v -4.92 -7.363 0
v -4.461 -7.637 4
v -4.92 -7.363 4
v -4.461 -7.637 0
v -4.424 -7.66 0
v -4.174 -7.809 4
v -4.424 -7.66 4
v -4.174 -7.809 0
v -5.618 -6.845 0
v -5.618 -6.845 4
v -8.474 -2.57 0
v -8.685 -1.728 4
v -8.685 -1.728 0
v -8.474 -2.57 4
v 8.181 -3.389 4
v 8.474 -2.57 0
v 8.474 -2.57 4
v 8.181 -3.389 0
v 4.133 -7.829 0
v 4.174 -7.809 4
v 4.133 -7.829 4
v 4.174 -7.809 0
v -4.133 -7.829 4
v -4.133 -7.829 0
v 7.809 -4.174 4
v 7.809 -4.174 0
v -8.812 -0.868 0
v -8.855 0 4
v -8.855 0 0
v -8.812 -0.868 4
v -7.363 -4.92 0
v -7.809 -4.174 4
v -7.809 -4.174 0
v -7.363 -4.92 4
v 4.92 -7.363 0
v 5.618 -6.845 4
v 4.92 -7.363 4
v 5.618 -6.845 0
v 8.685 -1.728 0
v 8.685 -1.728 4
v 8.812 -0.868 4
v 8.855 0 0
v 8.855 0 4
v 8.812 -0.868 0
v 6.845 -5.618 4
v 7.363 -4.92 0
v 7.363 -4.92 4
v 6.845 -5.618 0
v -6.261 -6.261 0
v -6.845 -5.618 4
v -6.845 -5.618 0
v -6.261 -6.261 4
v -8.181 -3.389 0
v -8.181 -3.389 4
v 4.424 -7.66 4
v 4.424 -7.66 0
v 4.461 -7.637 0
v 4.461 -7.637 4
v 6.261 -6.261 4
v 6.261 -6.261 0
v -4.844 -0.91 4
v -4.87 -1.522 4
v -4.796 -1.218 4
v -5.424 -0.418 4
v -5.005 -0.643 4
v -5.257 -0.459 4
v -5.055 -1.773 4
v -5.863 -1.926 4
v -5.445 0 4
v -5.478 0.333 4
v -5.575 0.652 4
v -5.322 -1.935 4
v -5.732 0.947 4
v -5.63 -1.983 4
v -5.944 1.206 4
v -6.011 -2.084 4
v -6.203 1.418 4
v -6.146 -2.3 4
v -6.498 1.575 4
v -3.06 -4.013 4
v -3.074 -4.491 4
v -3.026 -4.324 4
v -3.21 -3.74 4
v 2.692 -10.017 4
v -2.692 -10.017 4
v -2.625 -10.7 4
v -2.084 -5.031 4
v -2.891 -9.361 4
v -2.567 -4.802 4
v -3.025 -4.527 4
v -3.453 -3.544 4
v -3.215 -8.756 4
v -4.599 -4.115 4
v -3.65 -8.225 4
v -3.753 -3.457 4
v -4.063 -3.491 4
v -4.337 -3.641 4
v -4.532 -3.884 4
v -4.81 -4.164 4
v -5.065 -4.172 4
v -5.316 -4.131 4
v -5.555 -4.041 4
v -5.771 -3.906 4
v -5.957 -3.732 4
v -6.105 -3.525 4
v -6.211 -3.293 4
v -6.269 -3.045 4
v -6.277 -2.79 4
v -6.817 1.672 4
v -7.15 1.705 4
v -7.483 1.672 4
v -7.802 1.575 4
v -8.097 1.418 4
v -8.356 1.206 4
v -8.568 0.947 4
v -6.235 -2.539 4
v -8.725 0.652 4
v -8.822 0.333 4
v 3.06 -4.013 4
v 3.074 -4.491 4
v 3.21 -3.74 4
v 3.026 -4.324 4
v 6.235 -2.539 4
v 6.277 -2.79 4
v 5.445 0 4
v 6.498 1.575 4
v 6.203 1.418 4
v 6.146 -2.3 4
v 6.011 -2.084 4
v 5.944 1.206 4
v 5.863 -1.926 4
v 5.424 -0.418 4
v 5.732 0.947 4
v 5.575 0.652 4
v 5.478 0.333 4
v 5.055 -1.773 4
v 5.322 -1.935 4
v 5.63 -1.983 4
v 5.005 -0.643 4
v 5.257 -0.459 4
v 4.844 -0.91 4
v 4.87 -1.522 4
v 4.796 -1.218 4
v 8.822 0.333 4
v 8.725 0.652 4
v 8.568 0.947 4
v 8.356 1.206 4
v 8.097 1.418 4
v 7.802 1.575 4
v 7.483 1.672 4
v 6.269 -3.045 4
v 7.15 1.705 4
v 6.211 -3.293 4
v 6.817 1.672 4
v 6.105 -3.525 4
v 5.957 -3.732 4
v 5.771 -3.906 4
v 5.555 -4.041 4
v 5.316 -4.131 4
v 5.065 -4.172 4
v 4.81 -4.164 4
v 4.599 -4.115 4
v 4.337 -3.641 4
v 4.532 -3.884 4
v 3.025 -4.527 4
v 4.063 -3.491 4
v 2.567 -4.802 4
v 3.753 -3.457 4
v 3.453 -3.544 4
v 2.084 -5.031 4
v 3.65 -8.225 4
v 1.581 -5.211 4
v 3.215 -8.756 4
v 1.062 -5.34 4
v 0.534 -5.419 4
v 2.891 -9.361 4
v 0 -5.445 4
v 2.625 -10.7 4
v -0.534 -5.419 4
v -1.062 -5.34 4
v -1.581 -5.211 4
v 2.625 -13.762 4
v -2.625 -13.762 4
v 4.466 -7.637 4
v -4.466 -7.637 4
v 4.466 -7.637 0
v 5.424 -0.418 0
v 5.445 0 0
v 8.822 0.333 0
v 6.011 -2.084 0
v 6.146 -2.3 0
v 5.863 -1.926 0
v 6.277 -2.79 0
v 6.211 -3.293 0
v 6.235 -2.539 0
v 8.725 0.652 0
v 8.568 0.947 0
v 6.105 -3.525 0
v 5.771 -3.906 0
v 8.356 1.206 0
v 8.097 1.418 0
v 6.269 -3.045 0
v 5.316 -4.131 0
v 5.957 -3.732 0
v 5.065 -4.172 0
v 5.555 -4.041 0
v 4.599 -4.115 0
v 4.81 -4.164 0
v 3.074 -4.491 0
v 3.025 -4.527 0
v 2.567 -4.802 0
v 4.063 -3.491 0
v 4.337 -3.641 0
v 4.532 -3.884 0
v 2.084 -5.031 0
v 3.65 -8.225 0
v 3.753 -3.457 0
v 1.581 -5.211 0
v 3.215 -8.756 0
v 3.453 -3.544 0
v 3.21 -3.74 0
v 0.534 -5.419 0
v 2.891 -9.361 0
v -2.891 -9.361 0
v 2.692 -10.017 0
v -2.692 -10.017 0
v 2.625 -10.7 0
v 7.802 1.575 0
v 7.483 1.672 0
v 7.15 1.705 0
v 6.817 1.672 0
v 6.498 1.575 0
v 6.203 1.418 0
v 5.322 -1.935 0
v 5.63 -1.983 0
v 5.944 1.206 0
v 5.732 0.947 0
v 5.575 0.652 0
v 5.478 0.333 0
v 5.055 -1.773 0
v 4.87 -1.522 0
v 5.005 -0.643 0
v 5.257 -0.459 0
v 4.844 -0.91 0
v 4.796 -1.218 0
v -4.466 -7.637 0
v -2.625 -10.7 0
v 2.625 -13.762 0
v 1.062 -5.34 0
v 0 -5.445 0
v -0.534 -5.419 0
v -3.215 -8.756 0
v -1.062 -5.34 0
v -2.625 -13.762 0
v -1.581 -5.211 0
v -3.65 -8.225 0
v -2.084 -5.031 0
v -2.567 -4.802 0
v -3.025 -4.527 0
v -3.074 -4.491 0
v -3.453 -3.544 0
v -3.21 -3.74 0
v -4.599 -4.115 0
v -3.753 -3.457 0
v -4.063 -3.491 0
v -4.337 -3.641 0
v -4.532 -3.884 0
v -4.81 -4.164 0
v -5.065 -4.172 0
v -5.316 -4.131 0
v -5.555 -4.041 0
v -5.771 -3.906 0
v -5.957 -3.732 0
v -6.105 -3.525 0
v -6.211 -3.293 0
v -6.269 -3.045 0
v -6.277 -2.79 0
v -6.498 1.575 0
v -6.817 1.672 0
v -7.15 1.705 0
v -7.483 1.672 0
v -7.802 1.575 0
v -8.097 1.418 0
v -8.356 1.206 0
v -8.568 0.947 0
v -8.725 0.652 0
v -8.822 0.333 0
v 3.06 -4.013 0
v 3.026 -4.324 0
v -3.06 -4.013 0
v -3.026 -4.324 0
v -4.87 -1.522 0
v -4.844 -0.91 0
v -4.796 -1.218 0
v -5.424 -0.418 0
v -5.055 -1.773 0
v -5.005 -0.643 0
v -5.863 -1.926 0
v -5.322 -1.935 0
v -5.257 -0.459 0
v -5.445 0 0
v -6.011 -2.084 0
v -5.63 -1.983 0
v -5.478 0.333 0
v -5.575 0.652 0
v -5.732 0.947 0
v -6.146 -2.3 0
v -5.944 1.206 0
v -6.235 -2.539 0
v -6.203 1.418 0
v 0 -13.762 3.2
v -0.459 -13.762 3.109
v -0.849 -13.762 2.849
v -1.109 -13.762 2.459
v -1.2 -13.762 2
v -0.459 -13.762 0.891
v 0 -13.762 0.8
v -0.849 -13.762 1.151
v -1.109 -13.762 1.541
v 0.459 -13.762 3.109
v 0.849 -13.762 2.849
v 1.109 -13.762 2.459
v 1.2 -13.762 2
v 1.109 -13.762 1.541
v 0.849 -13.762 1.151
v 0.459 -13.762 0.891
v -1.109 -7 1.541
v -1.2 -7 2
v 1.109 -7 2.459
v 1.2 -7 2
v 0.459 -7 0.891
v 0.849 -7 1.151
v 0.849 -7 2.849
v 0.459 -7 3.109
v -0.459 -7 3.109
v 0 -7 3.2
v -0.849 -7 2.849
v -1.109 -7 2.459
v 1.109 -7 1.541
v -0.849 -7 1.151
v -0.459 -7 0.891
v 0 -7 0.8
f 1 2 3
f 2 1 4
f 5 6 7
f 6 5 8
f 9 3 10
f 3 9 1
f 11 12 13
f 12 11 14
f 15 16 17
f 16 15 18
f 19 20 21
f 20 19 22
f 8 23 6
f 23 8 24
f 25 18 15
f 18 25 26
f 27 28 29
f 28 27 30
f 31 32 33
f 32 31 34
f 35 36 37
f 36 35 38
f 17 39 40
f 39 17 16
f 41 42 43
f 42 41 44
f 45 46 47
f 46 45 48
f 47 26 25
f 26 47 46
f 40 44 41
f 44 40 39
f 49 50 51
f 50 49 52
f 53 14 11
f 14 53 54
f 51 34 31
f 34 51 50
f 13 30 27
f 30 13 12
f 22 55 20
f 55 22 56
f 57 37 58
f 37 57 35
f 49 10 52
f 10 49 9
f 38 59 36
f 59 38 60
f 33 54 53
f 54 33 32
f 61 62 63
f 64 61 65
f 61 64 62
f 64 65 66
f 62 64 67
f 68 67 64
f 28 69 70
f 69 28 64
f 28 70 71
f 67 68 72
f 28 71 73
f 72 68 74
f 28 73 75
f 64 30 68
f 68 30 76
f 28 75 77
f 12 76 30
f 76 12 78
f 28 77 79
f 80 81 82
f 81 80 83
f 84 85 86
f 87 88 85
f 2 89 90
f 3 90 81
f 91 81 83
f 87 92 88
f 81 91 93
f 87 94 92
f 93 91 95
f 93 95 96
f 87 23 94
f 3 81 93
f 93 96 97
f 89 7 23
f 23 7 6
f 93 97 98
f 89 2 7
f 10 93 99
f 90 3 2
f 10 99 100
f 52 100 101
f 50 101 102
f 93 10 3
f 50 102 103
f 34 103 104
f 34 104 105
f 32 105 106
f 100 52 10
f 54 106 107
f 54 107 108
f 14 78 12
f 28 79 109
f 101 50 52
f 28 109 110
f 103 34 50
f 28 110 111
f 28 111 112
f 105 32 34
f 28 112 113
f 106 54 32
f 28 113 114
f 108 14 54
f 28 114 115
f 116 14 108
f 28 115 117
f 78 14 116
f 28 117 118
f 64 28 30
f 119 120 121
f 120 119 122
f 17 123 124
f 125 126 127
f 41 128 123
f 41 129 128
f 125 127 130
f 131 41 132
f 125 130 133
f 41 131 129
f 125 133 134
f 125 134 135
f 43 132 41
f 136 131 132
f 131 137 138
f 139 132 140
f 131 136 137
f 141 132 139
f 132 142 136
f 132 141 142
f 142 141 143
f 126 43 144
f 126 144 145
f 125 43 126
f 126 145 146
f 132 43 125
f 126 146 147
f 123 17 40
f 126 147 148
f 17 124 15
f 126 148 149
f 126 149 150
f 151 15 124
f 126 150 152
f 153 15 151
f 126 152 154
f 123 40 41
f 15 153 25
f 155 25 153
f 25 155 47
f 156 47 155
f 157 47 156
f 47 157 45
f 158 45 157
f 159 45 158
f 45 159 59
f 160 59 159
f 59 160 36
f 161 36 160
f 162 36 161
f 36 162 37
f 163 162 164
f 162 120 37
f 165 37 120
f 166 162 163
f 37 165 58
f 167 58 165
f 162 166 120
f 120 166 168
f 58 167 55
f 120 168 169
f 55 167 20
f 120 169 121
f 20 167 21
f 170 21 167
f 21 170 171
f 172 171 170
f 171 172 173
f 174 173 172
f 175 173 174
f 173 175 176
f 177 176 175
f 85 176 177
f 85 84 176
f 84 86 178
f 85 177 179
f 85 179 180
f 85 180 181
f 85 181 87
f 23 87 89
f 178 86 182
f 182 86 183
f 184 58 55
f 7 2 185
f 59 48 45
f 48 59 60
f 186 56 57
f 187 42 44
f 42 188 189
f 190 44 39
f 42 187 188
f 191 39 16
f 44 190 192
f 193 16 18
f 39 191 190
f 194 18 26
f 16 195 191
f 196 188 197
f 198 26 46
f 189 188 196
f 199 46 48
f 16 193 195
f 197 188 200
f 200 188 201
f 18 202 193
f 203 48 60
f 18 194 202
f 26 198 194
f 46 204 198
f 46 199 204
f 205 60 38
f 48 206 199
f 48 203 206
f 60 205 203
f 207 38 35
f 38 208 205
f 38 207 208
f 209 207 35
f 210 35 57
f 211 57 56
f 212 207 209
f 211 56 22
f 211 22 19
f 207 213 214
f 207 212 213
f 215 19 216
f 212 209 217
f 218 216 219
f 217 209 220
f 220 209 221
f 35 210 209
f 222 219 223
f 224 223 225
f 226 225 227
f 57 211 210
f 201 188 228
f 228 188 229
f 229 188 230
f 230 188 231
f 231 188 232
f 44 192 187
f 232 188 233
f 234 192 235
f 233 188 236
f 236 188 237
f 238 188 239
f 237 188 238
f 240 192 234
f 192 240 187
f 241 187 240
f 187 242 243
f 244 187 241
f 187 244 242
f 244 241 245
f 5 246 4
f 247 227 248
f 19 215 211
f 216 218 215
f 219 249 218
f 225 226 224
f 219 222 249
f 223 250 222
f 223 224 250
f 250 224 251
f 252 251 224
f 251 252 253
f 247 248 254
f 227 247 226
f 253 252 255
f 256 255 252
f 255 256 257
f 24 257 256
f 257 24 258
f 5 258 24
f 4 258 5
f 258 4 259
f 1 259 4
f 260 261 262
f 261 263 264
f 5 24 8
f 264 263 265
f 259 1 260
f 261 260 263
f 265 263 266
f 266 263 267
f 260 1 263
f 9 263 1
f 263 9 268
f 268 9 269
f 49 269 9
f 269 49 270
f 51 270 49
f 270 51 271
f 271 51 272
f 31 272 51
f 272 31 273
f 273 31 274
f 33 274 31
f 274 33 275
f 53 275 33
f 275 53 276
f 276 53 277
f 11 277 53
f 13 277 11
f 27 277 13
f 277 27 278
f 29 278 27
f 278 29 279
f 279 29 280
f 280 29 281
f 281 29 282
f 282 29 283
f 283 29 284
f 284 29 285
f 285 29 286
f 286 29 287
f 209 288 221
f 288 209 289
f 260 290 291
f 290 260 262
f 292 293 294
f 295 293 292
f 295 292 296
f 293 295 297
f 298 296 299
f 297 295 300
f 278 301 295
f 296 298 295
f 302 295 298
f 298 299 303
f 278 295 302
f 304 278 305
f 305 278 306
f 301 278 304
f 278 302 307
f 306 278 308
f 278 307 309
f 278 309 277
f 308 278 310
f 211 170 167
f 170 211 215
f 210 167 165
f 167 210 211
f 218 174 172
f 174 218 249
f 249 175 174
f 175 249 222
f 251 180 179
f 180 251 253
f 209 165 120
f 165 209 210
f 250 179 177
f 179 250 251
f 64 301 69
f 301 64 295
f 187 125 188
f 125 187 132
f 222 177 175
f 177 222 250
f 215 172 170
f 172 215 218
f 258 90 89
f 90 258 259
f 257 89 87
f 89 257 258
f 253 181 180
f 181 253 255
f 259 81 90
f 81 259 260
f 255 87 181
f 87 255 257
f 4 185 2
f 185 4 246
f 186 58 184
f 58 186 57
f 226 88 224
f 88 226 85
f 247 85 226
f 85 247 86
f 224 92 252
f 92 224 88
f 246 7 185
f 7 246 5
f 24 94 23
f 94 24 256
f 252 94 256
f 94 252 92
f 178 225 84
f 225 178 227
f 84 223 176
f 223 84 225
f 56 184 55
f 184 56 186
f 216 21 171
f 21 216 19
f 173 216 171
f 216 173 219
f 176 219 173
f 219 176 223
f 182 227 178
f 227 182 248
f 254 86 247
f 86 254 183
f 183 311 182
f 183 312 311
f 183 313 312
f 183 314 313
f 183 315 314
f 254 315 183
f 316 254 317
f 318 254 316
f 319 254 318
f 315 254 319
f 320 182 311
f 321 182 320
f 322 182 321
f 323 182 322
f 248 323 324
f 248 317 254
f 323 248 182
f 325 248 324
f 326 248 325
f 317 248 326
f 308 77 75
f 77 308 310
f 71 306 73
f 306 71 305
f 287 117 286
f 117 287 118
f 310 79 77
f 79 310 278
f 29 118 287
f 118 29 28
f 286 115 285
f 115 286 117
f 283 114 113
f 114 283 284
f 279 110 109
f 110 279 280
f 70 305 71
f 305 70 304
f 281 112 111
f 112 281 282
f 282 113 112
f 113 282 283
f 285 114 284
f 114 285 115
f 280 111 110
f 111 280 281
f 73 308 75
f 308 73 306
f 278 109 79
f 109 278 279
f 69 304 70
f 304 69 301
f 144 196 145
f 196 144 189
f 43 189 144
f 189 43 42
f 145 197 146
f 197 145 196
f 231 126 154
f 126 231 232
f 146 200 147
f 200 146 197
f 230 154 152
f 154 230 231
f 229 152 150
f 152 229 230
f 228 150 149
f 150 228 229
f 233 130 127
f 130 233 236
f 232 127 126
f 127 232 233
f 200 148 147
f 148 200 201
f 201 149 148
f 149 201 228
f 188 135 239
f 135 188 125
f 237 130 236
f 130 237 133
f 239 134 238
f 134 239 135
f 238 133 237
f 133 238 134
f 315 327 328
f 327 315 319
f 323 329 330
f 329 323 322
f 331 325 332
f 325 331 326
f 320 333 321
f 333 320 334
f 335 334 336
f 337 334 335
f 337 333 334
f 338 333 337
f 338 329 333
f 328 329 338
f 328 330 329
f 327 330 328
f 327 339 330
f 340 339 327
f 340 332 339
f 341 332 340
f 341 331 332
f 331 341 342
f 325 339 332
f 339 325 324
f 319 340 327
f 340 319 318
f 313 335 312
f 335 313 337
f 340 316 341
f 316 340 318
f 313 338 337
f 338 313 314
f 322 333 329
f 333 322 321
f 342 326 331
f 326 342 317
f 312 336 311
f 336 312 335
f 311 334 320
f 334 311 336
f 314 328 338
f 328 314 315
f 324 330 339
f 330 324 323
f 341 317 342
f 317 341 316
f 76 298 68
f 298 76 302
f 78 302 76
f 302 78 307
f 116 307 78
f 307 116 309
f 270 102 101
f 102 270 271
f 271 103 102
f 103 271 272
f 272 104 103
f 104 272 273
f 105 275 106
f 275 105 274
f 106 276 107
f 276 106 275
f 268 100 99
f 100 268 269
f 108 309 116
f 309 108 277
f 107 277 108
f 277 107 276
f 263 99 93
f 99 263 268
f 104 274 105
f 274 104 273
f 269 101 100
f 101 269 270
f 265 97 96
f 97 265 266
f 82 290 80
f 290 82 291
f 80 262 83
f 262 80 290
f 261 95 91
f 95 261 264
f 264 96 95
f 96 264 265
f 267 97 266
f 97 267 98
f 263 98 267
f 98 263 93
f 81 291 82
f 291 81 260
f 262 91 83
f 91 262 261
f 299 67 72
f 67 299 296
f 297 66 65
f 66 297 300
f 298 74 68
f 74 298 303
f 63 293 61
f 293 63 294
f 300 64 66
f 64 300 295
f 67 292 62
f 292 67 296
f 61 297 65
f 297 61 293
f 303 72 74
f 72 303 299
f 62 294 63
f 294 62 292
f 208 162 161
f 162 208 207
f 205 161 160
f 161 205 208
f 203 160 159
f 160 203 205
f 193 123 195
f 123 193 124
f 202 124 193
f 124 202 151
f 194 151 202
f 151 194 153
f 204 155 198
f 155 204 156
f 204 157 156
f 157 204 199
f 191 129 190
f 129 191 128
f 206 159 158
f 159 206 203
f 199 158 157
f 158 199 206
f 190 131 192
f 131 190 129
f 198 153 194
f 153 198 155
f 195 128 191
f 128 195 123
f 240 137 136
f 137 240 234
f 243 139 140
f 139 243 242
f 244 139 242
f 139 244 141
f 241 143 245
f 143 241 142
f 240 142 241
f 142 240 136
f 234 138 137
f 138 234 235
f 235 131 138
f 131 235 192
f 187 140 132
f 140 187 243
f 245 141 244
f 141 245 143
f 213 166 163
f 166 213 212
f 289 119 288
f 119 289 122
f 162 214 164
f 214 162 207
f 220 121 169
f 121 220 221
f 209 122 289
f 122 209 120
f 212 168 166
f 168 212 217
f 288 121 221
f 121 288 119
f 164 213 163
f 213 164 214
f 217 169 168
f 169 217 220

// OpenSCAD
DEBUG_LAYER = 10;
WIRE_DIAMETER = 2;
WIRE_RADIUS = WIRE_DIAMETER / 2;
MARBLE_DIAMETER = 9.5;
MARBLE_RADIUS = MARBLE_DIAMETER / 2;
HOLDER_WIDTH = 1;
DEFAULT_SPACE_OFFSET = 1.3;
DEFAULT_HEIGHT = 4;

module tube(h, outer, inner, $fn = 32) {
    in = min(outer, inner);
    out = max(outer, inner);
    
    difference() {
        cylinder(h, out, out, $fn);
        translate([0, 0, -1]) 
            cylinder(h+2, in, in,  $fn);
    };
}

module wireHolders(h, wireRadius, marbleRadius, angle = 120, spaceOffset = DEFAULT_SPACE_OFFSET) {
    innerRadius = wireRadius * spaceOffset;
    outerRadius = innerRadius + HOLDER_WIDTH;
    halfRadius = innerRadius + ((outerRadius - innerRadius) / 2);
    wireGrip = (outerRadius - innerRadius) * .8;
    
    rotate([0, 0, angle])
        translate([0, marbleRadius + wireRadius, 0]) {
            union() {
                difference() {
                    tube(h, innerRadius, outerRadius);
                    
                    rotate(250) 
                        translate([0, 0, -1]) 
                            cube([outerRadius, outerRadius * 1.1, h + 2]);            
                    
                    rotate(-250) 
                        translate([-outerRadius, 0, -1]) 
                            cube([outerRadius, outerRadius * 1.1, h + 2]);
                }
               
                rotate(190)
                    translate([halfRadius, 0, 0])
                        cylinder(h, wireGrip, wireGrip, $fn = 16);
                
                rotate(350)
                    translate([halfRadius, 0, 0])
                        cylinder(h, wireGrip, wireGrip, $fn = 16);
            }
        }
}

module cap(h, radius, posX, rotate) {
    rotate(rotate)
        translate([posX, 0, 0])
            cylinder(h, radius, radius, $fn = 32);
}
    
// 9.5mm marble
// 2mm wire


//////
// MAIN BRACKET
//////
difference() {
union() {
    ringInnerRadius = MARBLE_RADIUS + (WIRE_RADIUS * DEFAULT_SPACE_OFFSET);
    ringOuterRadius = ringInnerRadius + (HOLDER_WIDTH * 2);
    ringSubtractionRadius = (ringInnerRadius - MARBLE_RADIUS) * 1.1;

    capRadius = ((ringOuterRadius * 1.1) - (ringInnerRadius * 0.9)) / 2;
    capPosX = (ringInnerRadius * .9) + capRadius;
    
    // CAP LEFT
    cap(DEFAULT_HEIGHT, capRadius, capPosX, 180);
    cap(DEFAULT_HEIGHT, capRadius, capPosX, 0);
    
    // HOLDER SPACE REMOVAL
    difference() {
        tube(DEFAULT_HEIGHT, ringInnerRadius * .9, ringOuterRadius * 1.1, $fn = 64);
        
        rotate(210)
            translate([ringInnerRadius, 0, -1])
                cylinder(DEFAULT_HEIGHT + 2, ringSubtractionRadius, ringSubtractionRadius, $fn = 16);

        rotate(330)
                translate([ringInnerRadius, 0, -1])
                    cylinder(DEFAULT_HEIGHT + 2, ringSubtractionRadius, ringSubtractionRadius, $fn = 16);
       
        rotate(180)
                translate([ringSubtractionRadius * -12, -ringSubtractionRadius * 10, -1])
                    cube([ringSubtractionRadius * 20, ringSubtractionRadius * 10, ringSubtractionRadius * 2 + (2 * DEFAULT_HEIGHT)]);
        
        rotate(0)
                translate([ringSubtractionRadius * -12, 0, -1])
                    cube([ringSubtractionRadius * 20, ringSubtractionRadius * 10, ringSubtractionRadius * 2 + (2 * DEFAULT_HEIGHT)]);
    }
    

        union() {
            SUPPORT_CARVE_RADIUS = 3.5;
            SUPPORT_CARVE_OFFSET = SUPPORT_CARVE_RADIUS * 1.75;
            bracketY = -1 * (MARBLE_RADIUS + (WIRE_RADIUS * DEFAULT_SPACE_OFFSET) + (HOLDER_WIDTH * 2) + (SUPPORT_CARVE_RADIUS / 2) + .9);
            
            difference() {
                translate([-SUPPORT_CARVE_OFFSET, bracketY, 0])
                    cube([SUPPORT_CARVE_OFFSET * 2, SUPPORT_CARVE_OFFSET / 2, DEFAULT_HEIGHT]);

                translate([-SUPPORT_CARVE_OFFSET, bracketY, -1])
                    cylinder(DEFAULT_HEIGHT + 2, SUPPORT_CARVE_RADIUS, SUPPORT_CARVE_RADIUS, $fn = 32);

                translate([SUPPORT_CARVE_OFFSET, bracketY, -1])
                    cylinder(DEFAULT_HEIGHT + 2, SUPPORT_CARVE_RADIUS, SUPPORT_CARVE_RADIUS, $fn = 32);
            }
            
            translate([SUPPORT_CARVE_RADIUS * -.75, bracketY - SUPPORT_CARVE_OFFSET / 2, 0])
                cube([SUPPORT_CARVE_RADIUS * 1.5, SUPPORT_CARVE_OFFSET / 2, DEFAULT_HEIGHT]);
        }
    }
    
    rotate([90, 0, 0])
        translate([0, DEFAULT_HEIGHT / 2, 7])
            cylinder(20, WIRE_RADIUS * 1.2, WIRE_RADIUS * 1.2, $fn = 16);
    }



wireHolders(DEFAULT_HEIGHT, WIRE_RADIUS, MARBLE_RADIUS, 120);
wireHolders(DEFAULT_HEIGHT, WIRE_RADIUS, MARBLE_RADIUS, -120);

*color("#ff0000") {
    *circle(MARBLE_RADIUS, $fn=32);
    *translate([0,-5,1.5]) 
        linear_extrude(3)
            import("track-bracket-180-3.svg", center=true);

}
